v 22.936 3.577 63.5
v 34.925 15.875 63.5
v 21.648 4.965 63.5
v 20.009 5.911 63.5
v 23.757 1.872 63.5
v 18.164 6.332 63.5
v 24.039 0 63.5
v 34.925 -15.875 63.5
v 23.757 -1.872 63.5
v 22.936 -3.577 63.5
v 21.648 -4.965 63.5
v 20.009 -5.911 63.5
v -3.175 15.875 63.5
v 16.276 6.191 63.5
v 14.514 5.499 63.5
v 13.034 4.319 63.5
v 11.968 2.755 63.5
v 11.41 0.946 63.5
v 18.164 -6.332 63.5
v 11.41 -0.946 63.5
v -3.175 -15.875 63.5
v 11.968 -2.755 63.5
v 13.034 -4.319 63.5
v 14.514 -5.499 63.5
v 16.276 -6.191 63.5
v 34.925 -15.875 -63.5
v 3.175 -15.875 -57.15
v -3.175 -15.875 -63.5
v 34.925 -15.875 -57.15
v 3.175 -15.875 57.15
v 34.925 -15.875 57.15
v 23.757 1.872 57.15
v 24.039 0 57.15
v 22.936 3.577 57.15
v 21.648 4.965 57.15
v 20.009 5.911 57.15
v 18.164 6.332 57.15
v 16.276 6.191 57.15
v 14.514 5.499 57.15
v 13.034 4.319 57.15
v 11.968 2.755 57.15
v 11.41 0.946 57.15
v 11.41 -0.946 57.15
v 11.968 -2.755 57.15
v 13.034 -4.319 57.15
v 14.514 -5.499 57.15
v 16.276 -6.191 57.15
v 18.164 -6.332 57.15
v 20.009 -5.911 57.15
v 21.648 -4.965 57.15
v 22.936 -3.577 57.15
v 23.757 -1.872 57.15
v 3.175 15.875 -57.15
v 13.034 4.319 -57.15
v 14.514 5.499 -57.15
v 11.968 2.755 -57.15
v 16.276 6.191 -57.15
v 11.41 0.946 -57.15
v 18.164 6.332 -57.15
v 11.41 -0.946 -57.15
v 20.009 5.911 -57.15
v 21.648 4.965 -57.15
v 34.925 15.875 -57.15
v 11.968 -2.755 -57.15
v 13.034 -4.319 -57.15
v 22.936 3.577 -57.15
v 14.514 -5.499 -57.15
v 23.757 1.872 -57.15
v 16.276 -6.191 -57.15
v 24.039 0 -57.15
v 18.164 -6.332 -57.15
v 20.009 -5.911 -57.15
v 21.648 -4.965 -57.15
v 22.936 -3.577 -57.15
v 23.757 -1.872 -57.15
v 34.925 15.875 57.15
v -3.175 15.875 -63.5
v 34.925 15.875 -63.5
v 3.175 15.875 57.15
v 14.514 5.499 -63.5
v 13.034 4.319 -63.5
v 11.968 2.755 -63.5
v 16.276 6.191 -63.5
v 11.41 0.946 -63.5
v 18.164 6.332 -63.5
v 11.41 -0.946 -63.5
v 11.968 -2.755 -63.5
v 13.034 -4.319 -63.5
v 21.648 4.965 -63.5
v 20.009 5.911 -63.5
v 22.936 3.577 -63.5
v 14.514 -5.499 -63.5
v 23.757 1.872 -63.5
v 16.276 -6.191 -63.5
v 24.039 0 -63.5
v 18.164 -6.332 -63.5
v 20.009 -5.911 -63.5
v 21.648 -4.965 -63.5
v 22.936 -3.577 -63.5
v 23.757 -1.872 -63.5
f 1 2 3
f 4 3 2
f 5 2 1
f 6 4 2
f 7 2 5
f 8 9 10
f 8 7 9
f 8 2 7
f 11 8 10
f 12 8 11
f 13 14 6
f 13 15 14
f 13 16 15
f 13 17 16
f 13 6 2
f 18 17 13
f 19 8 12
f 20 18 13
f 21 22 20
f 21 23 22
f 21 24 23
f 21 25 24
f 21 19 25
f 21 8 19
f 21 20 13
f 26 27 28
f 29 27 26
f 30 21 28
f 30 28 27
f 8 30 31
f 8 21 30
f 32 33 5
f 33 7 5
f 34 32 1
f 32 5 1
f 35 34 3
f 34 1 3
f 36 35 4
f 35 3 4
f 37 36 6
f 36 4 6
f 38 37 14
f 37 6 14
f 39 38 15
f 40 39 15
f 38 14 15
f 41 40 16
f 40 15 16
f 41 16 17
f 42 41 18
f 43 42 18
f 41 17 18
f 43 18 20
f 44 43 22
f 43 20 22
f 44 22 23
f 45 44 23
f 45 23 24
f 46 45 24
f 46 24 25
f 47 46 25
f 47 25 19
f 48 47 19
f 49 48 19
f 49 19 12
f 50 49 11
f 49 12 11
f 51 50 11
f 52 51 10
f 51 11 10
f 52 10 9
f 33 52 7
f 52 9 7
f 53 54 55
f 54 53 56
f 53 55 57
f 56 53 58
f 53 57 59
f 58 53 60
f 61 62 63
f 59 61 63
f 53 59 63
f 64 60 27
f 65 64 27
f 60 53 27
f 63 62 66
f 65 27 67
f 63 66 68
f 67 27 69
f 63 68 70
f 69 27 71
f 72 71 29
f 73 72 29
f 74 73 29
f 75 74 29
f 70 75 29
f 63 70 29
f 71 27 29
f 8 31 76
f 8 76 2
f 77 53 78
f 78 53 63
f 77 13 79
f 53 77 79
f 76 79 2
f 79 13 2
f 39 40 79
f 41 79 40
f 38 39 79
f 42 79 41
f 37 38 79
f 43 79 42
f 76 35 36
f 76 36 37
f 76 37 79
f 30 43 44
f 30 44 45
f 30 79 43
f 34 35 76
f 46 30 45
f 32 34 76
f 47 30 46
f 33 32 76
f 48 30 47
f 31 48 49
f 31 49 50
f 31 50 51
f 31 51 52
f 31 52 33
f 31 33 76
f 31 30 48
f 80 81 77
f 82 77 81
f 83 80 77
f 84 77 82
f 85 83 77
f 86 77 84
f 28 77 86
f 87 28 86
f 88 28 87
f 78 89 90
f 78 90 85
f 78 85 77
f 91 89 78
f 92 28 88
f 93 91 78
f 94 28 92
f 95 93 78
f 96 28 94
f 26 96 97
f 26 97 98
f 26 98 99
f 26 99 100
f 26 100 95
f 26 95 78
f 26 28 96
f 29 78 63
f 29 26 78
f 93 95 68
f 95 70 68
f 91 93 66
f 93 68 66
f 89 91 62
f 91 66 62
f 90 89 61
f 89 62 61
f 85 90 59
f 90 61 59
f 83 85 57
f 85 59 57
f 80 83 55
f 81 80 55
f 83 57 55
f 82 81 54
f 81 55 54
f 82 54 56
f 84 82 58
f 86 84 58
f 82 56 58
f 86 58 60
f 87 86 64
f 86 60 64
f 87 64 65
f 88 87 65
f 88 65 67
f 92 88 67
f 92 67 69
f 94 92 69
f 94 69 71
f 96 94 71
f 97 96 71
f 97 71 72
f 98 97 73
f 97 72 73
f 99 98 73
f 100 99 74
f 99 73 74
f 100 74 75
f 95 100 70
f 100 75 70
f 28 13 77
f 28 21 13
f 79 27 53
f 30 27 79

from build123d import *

# Parameters (mm, degrees)
F0_W     = 31.75
F0_H     = 6.35
F1_DEPTH = 15.875
F2_R     = 6.35
F3_DEPTH = 127


with BuildPart() as f1:
    # F0 (on Front) → F1 (new body, symmetric)
    with BuildSketch(Plane.XZ):
        with Locations((19.05, -60.325)):
            Rectangle(F0_W, F0_H)
        Polygon((3.175, 63.5), (-3.175, 63.5), (-3.175, -63.5), (3.175, -63.5), (3.175, -57.15), (3.175, 57.15), align=None)
        with Locations((19.05, 60.325)):
            Rectangle(F0_W, F0_H)
    extrude(amount=F1_DEPTH, both=True)

    # F2 (on Top) → F3 (cut, symmetric)
    with BuildSketch(Plane.XY):
        with Locations((17.689286, 0)):
            Circle(F2_R)
    extrude(amount=F3_DEPTH, both=True, mode=Mode.SUBTRACT)


solid = f1.part
